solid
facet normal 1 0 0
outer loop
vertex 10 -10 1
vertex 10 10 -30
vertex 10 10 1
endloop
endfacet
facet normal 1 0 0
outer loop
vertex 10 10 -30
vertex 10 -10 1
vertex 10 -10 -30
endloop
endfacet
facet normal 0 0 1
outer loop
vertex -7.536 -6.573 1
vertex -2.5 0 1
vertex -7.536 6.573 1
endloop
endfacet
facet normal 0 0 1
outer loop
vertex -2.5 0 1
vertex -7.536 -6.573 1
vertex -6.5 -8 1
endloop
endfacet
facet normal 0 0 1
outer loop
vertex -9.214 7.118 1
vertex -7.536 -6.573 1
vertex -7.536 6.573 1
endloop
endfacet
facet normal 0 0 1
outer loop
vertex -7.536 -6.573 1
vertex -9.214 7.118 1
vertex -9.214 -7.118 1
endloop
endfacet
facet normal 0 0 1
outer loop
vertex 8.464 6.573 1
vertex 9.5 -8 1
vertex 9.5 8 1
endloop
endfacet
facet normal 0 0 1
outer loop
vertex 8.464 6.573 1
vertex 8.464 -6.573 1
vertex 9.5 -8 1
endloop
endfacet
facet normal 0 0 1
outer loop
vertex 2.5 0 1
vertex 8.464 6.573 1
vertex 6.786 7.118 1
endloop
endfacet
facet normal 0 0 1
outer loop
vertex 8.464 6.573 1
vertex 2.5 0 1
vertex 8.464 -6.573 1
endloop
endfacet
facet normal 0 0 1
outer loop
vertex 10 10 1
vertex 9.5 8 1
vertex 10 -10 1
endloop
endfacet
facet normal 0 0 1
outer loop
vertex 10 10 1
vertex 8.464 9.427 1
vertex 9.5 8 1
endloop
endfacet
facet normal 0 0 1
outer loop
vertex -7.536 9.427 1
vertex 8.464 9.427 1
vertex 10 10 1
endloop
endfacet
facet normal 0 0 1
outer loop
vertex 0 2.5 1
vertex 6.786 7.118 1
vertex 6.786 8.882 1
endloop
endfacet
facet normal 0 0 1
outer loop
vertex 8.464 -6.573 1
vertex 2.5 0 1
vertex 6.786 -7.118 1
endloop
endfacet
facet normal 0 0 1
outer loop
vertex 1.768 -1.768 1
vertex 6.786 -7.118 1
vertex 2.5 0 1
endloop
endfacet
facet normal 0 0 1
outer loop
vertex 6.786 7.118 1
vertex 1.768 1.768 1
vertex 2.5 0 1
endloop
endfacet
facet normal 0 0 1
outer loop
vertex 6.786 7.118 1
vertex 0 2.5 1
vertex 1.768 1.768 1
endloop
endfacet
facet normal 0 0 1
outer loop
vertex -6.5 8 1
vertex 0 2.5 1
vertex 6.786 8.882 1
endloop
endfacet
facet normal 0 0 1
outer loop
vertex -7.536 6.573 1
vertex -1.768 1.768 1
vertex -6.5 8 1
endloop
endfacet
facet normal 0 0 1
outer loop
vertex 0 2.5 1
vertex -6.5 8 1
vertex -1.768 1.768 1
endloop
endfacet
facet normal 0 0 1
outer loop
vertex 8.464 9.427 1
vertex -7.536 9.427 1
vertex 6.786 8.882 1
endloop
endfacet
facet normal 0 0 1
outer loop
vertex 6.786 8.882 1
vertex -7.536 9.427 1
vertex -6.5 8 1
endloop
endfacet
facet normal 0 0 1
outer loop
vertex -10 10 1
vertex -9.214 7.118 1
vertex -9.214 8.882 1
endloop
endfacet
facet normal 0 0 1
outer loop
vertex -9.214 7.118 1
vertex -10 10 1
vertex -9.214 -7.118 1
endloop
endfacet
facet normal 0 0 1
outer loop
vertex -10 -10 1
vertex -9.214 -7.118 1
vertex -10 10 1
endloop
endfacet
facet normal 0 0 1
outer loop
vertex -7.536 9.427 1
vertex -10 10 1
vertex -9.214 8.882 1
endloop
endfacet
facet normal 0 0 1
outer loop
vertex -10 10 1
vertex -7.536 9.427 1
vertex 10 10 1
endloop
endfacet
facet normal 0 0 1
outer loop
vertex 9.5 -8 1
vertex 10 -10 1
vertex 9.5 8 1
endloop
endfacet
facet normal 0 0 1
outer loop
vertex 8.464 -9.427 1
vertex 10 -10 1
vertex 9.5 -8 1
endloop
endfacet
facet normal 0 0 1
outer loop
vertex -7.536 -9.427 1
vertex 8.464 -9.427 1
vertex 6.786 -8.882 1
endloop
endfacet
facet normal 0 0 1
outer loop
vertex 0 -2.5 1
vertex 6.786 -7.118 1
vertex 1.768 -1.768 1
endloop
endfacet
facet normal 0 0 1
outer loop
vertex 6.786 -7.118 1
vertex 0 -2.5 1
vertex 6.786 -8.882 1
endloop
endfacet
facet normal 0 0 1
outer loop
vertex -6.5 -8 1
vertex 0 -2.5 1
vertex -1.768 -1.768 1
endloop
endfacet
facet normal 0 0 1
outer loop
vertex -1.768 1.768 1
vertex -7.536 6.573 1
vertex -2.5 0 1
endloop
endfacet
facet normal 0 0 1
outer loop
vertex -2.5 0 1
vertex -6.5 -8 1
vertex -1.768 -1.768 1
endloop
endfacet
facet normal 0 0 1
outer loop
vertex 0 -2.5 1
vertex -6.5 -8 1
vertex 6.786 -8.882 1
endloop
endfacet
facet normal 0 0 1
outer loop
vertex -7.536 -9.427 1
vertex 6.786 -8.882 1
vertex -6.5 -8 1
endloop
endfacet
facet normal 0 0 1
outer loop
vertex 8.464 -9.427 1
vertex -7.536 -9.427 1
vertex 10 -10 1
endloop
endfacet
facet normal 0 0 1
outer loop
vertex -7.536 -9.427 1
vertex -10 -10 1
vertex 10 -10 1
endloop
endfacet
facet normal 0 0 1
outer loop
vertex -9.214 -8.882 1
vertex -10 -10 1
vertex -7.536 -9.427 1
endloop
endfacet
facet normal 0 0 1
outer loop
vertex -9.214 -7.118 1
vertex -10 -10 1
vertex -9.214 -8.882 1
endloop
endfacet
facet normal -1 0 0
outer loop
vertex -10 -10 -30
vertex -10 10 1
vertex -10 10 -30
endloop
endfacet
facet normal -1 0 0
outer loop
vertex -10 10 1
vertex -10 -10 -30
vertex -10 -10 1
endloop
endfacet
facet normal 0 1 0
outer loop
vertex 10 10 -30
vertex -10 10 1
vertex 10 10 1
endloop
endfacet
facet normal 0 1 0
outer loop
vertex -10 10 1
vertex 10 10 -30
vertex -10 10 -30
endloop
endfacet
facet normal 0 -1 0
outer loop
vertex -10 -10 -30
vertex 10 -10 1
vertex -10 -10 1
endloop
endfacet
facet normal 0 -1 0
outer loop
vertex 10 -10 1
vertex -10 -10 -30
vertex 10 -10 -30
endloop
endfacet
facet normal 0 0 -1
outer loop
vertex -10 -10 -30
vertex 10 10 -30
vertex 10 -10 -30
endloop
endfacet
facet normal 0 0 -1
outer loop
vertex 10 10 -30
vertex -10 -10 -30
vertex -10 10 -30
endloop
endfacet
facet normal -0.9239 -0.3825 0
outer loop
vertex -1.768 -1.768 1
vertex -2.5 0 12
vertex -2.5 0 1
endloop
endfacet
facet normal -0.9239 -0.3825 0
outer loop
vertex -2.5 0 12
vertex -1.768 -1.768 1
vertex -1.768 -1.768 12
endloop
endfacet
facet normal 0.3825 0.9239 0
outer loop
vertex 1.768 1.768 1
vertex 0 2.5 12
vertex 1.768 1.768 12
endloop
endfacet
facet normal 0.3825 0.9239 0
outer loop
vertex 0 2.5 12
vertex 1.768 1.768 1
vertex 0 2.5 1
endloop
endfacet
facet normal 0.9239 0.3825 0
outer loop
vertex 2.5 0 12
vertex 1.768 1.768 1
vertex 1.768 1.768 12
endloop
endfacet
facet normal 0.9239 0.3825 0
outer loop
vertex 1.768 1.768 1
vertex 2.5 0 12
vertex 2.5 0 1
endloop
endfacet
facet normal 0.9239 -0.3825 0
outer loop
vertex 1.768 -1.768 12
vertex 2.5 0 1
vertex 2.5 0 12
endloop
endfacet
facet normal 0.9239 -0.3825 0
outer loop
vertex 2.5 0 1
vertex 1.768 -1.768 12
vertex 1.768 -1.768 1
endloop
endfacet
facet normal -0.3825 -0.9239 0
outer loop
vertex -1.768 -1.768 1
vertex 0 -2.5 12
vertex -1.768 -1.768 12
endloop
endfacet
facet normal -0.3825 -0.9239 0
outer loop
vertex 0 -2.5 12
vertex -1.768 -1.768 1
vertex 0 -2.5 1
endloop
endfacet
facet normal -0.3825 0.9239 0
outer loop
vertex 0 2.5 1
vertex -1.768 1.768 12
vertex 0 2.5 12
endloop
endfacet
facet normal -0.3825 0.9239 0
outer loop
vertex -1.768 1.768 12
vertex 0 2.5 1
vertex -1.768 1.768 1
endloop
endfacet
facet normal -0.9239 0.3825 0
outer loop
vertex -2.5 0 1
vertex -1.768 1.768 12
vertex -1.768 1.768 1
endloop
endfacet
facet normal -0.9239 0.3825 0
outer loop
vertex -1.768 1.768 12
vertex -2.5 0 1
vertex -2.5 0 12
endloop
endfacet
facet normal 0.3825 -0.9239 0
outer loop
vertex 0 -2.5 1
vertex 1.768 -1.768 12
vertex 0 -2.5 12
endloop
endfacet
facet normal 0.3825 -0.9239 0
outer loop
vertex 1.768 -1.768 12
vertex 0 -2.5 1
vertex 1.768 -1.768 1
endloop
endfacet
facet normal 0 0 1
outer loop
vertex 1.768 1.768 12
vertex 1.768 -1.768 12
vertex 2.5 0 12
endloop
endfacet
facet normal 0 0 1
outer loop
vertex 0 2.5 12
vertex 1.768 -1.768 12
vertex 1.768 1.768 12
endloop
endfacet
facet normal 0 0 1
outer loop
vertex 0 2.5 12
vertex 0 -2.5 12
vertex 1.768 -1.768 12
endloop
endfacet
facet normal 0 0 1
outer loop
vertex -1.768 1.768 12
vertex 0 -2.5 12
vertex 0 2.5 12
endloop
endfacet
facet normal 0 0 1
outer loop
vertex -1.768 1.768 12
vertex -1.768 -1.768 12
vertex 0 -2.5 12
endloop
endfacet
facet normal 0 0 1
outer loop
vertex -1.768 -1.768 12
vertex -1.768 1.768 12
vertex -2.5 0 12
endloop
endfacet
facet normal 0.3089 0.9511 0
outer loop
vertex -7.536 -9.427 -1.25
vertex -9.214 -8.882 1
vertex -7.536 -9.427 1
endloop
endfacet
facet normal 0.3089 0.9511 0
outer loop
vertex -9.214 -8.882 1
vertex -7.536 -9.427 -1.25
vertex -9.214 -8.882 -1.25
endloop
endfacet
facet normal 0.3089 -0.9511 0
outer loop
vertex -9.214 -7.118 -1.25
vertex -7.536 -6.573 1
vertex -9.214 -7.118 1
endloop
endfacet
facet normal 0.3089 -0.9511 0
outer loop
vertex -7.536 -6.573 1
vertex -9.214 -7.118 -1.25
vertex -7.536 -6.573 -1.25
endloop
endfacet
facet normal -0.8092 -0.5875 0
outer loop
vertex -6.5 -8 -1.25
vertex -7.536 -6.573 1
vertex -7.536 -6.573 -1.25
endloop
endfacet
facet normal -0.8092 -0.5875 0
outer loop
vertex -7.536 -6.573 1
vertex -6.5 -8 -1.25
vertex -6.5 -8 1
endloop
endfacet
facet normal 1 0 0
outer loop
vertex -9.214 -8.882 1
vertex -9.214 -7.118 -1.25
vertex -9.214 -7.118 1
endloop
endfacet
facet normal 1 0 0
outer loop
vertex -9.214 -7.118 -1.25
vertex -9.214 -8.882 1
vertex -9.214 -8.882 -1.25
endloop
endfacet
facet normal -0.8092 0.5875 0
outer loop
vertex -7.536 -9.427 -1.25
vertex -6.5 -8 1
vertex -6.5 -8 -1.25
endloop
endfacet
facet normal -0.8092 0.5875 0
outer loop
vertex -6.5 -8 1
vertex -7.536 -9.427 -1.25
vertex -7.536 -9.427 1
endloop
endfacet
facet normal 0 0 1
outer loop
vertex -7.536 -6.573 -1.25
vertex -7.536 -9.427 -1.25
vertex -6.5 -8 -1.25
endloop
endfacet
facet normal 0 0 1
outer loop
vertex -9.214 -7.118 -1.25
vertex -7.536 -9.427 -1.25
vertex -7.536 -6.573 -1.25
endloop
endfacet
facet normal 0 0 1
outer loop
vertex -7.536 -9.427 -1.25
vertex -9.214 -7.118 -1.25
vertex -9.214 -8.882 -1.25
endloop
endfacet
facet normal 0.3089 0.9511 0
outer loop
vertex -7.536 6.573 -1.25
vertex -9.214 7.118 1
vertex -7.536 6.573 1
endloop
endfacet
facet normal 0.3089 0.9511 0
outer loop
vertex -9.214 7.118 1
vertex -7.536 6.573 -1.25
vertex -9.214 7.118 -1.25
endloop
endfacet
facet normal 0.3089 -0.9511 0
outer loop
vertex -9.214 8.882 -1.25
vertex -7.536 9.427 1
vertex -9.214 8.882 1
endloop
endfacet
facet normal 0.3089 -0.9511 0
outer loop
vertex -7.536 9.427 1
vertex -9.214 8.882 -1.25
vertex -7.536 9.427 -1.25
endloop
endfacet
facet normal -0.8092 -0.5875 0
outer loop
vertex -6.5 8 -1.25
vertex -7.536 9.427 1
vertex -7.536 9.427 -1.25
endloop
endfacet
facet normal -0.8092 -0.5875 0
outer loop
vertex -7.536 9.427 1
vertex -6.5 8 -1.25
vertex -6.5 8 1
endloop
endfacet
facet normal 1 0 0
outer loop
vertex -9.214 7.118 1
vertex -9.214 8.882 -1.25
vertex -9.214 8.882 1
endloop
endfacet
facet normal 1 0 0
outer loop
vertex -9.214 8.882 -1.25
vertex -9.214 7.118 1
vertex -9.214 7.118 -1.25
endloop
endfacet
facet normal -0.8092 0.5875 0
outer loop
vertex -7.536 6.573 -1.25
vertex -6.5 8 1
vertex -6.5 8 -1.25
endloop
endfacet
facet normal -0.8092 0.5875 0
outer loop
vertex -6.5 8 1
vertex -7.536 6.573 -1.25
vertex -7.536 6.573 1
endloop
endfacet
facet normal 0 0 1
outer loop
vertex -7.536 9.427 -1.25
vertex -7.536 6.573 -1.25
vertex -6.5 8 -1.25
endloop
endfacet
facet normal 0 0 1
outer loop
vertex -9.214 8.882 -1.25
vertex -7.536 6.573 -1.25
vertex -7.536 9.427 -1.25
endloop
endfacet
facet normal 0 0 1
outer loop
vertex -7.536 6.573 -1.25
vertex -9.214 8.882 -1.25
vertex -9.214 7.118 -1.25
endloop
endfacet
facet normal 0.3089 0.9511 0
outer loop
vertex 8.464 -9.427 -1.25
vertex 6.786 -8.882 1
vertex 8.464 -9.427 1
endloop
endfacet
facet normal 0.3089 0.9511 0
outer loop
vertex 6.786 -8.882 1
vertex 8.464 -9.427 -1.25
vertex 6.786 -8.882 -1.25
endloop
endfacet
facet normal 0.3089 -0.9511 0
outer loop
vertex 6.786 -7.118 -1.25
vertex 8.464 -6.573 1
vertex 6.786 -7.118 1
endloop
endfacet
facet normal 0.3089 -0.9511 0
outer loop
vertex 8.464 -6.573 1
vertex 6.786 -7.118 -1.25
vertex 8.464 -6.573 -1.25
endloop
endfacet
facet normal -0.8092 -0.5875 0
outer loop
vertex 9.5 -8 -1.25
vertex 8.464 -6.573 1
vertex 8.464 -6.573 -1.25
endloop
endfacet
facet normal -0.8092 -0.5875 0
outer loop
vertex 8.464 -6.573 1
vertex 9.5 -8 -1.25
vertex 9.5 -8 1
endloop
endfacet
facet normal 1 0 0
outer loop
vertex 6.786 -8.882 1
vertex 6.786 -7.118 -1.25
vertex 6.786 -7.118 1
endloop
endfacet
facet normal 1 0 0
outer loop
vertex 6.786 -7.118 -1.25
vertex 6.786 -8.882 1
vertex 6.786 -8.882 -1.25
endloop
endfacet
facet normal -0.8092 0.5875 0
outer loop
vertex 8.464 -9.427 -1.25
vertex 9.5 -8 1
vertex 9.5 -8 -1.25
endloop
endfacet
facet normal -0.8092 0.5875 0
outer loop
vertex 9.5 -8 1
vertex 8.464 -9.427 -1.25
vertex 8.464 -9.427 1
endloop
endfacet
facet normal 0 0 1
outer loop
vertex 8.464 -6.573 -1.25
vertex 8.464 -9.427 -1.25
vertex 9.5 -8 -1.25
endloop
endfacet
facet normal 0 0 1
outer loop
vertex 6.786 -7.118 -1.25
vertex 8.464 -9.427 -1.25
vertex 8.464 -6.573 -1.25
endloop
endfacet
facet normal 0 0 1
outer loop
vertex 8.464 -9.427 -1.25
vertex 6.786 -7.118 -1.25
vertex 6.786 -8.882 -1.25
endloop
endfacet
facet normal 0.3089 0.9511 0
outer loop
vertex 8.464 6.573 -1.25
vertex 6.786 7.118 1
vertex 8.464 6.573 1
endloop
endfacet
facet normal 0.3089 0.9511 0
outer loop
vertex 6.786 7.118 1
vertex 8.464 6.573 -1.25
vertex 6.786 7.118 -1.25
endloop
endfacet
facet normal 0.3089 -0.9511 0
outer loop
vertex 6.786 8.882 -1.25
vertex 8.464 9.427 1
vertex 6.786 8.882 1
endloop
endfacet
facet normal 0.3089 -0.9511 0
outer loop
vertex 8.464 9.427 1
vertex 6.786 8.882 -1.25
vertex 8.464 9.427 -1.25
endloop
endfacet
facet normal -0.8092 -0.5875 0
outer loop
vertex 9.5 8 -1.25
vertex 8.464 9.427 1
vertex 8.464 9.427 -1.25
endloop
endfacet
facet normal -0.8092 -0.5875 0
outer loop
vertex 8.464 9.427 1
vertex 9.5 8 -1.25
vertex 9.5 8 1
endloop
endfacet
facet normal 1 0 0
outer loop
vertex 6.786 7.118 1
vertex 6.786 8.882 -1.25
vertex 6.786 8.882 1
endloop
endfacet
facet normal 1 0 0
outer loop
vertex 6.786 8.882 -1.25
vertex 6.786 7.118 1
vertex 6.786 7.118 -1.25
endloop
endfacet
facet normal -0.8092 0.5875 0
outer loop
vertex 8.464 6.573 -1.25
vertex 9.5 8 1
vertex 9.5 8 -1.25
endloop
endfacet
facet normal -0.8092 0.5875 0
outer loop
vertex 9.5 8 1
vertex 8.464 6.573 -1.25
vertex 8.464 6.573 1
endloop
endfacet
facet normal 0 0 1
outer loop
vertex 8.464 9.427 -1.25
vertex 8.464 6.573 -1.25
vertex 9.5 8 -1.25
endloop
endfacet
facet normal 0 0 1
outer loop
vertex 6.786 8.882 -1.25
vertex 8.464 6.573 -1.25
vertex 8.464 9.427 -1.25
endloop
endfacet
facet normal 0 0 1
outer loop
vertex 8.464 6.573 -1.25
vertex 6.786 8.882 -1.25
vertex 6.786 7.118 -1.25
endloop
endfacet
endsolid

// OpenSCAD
// Parameters
face_width = 20.0; //[10.0:40.0:0.5]
body_length = 30.0; //[15.0:60.0:0.5]
body_width = 20.0; //[10.0:40.0:0.5]
body_height = 20.0; //[10.0:40.0:0.5]
front_face_thickness = 2.0; //[1.0:6.0:0.25]
shaft_diameter = 5.0; //[2.0:10.0:0.25]
shaft_length = 12.0; //[6.0:30.0:0.5]
mounting_hole_spacing = 16.0; //[8.0:32.0:0.5]
mounting_hole_diameter = 3.0; //[1.5:6.0:0.25]
overlap = 1.0; //[0.5:2.0:0.1]
hole_extra = 0.5; //[0.1:1.5:0.1]
d_plug_length = 10.0; //[5.0:20.0:0.5]
d_plug_width = 6.0; //[3.0:12.0:0.5]
d_plug_rad = 1.0; //[0.5:3.0:0.25]
aux_stub_size = 0.5; //[0.2:2.0:0.1]

// Modules for mandatory components
module d_plug_D() {
  color("DimGray") {
    linear_extrude(height=aux_stub_size, center=true) {
      polygon(points=[
        [-d_plug_length/2, -d_plug_width/2],
        [d_plug_length/2, -d_plug_width/2],
        [d_plug_length/2, d_plug_width/2],
        [-d_plug_length/2, d_plug_width/2]
      ]);
    }
  }
}

module grill_hole_positions() {
  color("Silver") {
    translate([0, 0, -(front_face_thickness/2 + body_length/2)])
      sphere(r=1);
  }
}

module screw_and_washer() {
  color("Black") {
    translate([0, 0, -(front_face_thickness/2 + body_length/2)])
      cylinder(r=aux_stub_size/2, h=aux_stub_size, center=true);
  }
}

module ttrack_hole_positions() {
  color("Silver") {
    translate([0, 0, -(front_face_thickness/2 + body_length/2)])
      cube([aux_stub_size, aux_stub_size, aux_stub_size], center=true);
  }
}

module rail_hole_positions() {
  color("Silver") {
    translate([0, 0, -(front_face_thickness/2 + body_length/2)])
      cube([aux_stub_size, aux_stub_size, aux_stub_size], center=true);
  }
}

// Main motor assembly
module motor_with_mounting_holes() {
  difference() {
    union() {
      // Front face
      color("Black") translate([0, 0, 0])
        cube([face_width, face_width, front_face_thickness], center=true);
      
      // Motor body
      translate([0, 0, -(front_face_thickness/2 + body_length/2 - overlap)])
        cube([body_width, body_height, body_length], center=true);
      
      // Output shaft
      color("Silver") translate([0, 0, front_face_thickness/2 + shaft_length/2 - overlap])
        cylinder(r=shaft_diameter/2, h=shaft_length, center=true);
      
      // Placeholder components
      d_plug_D();
      grill_hole_positions();
      screw_and_washer();
      ttrack_hole_positions();
      rail_hole_positions();
    }
    
    // Mounting holes
    for (x = [-1, 1], y = [-1, 1]) {
      translate([x * mounting_hole_spacing/2, y * mounting_hole_spacing/2, 0])
        cylinder(r=mounting_hole_diameter/2, h=front_face_thickness + hole_extra, center=true);
    }
  }
}

// Final assembly
module assembly() {
  motor_with_mounting_holes();
}

assembly();
